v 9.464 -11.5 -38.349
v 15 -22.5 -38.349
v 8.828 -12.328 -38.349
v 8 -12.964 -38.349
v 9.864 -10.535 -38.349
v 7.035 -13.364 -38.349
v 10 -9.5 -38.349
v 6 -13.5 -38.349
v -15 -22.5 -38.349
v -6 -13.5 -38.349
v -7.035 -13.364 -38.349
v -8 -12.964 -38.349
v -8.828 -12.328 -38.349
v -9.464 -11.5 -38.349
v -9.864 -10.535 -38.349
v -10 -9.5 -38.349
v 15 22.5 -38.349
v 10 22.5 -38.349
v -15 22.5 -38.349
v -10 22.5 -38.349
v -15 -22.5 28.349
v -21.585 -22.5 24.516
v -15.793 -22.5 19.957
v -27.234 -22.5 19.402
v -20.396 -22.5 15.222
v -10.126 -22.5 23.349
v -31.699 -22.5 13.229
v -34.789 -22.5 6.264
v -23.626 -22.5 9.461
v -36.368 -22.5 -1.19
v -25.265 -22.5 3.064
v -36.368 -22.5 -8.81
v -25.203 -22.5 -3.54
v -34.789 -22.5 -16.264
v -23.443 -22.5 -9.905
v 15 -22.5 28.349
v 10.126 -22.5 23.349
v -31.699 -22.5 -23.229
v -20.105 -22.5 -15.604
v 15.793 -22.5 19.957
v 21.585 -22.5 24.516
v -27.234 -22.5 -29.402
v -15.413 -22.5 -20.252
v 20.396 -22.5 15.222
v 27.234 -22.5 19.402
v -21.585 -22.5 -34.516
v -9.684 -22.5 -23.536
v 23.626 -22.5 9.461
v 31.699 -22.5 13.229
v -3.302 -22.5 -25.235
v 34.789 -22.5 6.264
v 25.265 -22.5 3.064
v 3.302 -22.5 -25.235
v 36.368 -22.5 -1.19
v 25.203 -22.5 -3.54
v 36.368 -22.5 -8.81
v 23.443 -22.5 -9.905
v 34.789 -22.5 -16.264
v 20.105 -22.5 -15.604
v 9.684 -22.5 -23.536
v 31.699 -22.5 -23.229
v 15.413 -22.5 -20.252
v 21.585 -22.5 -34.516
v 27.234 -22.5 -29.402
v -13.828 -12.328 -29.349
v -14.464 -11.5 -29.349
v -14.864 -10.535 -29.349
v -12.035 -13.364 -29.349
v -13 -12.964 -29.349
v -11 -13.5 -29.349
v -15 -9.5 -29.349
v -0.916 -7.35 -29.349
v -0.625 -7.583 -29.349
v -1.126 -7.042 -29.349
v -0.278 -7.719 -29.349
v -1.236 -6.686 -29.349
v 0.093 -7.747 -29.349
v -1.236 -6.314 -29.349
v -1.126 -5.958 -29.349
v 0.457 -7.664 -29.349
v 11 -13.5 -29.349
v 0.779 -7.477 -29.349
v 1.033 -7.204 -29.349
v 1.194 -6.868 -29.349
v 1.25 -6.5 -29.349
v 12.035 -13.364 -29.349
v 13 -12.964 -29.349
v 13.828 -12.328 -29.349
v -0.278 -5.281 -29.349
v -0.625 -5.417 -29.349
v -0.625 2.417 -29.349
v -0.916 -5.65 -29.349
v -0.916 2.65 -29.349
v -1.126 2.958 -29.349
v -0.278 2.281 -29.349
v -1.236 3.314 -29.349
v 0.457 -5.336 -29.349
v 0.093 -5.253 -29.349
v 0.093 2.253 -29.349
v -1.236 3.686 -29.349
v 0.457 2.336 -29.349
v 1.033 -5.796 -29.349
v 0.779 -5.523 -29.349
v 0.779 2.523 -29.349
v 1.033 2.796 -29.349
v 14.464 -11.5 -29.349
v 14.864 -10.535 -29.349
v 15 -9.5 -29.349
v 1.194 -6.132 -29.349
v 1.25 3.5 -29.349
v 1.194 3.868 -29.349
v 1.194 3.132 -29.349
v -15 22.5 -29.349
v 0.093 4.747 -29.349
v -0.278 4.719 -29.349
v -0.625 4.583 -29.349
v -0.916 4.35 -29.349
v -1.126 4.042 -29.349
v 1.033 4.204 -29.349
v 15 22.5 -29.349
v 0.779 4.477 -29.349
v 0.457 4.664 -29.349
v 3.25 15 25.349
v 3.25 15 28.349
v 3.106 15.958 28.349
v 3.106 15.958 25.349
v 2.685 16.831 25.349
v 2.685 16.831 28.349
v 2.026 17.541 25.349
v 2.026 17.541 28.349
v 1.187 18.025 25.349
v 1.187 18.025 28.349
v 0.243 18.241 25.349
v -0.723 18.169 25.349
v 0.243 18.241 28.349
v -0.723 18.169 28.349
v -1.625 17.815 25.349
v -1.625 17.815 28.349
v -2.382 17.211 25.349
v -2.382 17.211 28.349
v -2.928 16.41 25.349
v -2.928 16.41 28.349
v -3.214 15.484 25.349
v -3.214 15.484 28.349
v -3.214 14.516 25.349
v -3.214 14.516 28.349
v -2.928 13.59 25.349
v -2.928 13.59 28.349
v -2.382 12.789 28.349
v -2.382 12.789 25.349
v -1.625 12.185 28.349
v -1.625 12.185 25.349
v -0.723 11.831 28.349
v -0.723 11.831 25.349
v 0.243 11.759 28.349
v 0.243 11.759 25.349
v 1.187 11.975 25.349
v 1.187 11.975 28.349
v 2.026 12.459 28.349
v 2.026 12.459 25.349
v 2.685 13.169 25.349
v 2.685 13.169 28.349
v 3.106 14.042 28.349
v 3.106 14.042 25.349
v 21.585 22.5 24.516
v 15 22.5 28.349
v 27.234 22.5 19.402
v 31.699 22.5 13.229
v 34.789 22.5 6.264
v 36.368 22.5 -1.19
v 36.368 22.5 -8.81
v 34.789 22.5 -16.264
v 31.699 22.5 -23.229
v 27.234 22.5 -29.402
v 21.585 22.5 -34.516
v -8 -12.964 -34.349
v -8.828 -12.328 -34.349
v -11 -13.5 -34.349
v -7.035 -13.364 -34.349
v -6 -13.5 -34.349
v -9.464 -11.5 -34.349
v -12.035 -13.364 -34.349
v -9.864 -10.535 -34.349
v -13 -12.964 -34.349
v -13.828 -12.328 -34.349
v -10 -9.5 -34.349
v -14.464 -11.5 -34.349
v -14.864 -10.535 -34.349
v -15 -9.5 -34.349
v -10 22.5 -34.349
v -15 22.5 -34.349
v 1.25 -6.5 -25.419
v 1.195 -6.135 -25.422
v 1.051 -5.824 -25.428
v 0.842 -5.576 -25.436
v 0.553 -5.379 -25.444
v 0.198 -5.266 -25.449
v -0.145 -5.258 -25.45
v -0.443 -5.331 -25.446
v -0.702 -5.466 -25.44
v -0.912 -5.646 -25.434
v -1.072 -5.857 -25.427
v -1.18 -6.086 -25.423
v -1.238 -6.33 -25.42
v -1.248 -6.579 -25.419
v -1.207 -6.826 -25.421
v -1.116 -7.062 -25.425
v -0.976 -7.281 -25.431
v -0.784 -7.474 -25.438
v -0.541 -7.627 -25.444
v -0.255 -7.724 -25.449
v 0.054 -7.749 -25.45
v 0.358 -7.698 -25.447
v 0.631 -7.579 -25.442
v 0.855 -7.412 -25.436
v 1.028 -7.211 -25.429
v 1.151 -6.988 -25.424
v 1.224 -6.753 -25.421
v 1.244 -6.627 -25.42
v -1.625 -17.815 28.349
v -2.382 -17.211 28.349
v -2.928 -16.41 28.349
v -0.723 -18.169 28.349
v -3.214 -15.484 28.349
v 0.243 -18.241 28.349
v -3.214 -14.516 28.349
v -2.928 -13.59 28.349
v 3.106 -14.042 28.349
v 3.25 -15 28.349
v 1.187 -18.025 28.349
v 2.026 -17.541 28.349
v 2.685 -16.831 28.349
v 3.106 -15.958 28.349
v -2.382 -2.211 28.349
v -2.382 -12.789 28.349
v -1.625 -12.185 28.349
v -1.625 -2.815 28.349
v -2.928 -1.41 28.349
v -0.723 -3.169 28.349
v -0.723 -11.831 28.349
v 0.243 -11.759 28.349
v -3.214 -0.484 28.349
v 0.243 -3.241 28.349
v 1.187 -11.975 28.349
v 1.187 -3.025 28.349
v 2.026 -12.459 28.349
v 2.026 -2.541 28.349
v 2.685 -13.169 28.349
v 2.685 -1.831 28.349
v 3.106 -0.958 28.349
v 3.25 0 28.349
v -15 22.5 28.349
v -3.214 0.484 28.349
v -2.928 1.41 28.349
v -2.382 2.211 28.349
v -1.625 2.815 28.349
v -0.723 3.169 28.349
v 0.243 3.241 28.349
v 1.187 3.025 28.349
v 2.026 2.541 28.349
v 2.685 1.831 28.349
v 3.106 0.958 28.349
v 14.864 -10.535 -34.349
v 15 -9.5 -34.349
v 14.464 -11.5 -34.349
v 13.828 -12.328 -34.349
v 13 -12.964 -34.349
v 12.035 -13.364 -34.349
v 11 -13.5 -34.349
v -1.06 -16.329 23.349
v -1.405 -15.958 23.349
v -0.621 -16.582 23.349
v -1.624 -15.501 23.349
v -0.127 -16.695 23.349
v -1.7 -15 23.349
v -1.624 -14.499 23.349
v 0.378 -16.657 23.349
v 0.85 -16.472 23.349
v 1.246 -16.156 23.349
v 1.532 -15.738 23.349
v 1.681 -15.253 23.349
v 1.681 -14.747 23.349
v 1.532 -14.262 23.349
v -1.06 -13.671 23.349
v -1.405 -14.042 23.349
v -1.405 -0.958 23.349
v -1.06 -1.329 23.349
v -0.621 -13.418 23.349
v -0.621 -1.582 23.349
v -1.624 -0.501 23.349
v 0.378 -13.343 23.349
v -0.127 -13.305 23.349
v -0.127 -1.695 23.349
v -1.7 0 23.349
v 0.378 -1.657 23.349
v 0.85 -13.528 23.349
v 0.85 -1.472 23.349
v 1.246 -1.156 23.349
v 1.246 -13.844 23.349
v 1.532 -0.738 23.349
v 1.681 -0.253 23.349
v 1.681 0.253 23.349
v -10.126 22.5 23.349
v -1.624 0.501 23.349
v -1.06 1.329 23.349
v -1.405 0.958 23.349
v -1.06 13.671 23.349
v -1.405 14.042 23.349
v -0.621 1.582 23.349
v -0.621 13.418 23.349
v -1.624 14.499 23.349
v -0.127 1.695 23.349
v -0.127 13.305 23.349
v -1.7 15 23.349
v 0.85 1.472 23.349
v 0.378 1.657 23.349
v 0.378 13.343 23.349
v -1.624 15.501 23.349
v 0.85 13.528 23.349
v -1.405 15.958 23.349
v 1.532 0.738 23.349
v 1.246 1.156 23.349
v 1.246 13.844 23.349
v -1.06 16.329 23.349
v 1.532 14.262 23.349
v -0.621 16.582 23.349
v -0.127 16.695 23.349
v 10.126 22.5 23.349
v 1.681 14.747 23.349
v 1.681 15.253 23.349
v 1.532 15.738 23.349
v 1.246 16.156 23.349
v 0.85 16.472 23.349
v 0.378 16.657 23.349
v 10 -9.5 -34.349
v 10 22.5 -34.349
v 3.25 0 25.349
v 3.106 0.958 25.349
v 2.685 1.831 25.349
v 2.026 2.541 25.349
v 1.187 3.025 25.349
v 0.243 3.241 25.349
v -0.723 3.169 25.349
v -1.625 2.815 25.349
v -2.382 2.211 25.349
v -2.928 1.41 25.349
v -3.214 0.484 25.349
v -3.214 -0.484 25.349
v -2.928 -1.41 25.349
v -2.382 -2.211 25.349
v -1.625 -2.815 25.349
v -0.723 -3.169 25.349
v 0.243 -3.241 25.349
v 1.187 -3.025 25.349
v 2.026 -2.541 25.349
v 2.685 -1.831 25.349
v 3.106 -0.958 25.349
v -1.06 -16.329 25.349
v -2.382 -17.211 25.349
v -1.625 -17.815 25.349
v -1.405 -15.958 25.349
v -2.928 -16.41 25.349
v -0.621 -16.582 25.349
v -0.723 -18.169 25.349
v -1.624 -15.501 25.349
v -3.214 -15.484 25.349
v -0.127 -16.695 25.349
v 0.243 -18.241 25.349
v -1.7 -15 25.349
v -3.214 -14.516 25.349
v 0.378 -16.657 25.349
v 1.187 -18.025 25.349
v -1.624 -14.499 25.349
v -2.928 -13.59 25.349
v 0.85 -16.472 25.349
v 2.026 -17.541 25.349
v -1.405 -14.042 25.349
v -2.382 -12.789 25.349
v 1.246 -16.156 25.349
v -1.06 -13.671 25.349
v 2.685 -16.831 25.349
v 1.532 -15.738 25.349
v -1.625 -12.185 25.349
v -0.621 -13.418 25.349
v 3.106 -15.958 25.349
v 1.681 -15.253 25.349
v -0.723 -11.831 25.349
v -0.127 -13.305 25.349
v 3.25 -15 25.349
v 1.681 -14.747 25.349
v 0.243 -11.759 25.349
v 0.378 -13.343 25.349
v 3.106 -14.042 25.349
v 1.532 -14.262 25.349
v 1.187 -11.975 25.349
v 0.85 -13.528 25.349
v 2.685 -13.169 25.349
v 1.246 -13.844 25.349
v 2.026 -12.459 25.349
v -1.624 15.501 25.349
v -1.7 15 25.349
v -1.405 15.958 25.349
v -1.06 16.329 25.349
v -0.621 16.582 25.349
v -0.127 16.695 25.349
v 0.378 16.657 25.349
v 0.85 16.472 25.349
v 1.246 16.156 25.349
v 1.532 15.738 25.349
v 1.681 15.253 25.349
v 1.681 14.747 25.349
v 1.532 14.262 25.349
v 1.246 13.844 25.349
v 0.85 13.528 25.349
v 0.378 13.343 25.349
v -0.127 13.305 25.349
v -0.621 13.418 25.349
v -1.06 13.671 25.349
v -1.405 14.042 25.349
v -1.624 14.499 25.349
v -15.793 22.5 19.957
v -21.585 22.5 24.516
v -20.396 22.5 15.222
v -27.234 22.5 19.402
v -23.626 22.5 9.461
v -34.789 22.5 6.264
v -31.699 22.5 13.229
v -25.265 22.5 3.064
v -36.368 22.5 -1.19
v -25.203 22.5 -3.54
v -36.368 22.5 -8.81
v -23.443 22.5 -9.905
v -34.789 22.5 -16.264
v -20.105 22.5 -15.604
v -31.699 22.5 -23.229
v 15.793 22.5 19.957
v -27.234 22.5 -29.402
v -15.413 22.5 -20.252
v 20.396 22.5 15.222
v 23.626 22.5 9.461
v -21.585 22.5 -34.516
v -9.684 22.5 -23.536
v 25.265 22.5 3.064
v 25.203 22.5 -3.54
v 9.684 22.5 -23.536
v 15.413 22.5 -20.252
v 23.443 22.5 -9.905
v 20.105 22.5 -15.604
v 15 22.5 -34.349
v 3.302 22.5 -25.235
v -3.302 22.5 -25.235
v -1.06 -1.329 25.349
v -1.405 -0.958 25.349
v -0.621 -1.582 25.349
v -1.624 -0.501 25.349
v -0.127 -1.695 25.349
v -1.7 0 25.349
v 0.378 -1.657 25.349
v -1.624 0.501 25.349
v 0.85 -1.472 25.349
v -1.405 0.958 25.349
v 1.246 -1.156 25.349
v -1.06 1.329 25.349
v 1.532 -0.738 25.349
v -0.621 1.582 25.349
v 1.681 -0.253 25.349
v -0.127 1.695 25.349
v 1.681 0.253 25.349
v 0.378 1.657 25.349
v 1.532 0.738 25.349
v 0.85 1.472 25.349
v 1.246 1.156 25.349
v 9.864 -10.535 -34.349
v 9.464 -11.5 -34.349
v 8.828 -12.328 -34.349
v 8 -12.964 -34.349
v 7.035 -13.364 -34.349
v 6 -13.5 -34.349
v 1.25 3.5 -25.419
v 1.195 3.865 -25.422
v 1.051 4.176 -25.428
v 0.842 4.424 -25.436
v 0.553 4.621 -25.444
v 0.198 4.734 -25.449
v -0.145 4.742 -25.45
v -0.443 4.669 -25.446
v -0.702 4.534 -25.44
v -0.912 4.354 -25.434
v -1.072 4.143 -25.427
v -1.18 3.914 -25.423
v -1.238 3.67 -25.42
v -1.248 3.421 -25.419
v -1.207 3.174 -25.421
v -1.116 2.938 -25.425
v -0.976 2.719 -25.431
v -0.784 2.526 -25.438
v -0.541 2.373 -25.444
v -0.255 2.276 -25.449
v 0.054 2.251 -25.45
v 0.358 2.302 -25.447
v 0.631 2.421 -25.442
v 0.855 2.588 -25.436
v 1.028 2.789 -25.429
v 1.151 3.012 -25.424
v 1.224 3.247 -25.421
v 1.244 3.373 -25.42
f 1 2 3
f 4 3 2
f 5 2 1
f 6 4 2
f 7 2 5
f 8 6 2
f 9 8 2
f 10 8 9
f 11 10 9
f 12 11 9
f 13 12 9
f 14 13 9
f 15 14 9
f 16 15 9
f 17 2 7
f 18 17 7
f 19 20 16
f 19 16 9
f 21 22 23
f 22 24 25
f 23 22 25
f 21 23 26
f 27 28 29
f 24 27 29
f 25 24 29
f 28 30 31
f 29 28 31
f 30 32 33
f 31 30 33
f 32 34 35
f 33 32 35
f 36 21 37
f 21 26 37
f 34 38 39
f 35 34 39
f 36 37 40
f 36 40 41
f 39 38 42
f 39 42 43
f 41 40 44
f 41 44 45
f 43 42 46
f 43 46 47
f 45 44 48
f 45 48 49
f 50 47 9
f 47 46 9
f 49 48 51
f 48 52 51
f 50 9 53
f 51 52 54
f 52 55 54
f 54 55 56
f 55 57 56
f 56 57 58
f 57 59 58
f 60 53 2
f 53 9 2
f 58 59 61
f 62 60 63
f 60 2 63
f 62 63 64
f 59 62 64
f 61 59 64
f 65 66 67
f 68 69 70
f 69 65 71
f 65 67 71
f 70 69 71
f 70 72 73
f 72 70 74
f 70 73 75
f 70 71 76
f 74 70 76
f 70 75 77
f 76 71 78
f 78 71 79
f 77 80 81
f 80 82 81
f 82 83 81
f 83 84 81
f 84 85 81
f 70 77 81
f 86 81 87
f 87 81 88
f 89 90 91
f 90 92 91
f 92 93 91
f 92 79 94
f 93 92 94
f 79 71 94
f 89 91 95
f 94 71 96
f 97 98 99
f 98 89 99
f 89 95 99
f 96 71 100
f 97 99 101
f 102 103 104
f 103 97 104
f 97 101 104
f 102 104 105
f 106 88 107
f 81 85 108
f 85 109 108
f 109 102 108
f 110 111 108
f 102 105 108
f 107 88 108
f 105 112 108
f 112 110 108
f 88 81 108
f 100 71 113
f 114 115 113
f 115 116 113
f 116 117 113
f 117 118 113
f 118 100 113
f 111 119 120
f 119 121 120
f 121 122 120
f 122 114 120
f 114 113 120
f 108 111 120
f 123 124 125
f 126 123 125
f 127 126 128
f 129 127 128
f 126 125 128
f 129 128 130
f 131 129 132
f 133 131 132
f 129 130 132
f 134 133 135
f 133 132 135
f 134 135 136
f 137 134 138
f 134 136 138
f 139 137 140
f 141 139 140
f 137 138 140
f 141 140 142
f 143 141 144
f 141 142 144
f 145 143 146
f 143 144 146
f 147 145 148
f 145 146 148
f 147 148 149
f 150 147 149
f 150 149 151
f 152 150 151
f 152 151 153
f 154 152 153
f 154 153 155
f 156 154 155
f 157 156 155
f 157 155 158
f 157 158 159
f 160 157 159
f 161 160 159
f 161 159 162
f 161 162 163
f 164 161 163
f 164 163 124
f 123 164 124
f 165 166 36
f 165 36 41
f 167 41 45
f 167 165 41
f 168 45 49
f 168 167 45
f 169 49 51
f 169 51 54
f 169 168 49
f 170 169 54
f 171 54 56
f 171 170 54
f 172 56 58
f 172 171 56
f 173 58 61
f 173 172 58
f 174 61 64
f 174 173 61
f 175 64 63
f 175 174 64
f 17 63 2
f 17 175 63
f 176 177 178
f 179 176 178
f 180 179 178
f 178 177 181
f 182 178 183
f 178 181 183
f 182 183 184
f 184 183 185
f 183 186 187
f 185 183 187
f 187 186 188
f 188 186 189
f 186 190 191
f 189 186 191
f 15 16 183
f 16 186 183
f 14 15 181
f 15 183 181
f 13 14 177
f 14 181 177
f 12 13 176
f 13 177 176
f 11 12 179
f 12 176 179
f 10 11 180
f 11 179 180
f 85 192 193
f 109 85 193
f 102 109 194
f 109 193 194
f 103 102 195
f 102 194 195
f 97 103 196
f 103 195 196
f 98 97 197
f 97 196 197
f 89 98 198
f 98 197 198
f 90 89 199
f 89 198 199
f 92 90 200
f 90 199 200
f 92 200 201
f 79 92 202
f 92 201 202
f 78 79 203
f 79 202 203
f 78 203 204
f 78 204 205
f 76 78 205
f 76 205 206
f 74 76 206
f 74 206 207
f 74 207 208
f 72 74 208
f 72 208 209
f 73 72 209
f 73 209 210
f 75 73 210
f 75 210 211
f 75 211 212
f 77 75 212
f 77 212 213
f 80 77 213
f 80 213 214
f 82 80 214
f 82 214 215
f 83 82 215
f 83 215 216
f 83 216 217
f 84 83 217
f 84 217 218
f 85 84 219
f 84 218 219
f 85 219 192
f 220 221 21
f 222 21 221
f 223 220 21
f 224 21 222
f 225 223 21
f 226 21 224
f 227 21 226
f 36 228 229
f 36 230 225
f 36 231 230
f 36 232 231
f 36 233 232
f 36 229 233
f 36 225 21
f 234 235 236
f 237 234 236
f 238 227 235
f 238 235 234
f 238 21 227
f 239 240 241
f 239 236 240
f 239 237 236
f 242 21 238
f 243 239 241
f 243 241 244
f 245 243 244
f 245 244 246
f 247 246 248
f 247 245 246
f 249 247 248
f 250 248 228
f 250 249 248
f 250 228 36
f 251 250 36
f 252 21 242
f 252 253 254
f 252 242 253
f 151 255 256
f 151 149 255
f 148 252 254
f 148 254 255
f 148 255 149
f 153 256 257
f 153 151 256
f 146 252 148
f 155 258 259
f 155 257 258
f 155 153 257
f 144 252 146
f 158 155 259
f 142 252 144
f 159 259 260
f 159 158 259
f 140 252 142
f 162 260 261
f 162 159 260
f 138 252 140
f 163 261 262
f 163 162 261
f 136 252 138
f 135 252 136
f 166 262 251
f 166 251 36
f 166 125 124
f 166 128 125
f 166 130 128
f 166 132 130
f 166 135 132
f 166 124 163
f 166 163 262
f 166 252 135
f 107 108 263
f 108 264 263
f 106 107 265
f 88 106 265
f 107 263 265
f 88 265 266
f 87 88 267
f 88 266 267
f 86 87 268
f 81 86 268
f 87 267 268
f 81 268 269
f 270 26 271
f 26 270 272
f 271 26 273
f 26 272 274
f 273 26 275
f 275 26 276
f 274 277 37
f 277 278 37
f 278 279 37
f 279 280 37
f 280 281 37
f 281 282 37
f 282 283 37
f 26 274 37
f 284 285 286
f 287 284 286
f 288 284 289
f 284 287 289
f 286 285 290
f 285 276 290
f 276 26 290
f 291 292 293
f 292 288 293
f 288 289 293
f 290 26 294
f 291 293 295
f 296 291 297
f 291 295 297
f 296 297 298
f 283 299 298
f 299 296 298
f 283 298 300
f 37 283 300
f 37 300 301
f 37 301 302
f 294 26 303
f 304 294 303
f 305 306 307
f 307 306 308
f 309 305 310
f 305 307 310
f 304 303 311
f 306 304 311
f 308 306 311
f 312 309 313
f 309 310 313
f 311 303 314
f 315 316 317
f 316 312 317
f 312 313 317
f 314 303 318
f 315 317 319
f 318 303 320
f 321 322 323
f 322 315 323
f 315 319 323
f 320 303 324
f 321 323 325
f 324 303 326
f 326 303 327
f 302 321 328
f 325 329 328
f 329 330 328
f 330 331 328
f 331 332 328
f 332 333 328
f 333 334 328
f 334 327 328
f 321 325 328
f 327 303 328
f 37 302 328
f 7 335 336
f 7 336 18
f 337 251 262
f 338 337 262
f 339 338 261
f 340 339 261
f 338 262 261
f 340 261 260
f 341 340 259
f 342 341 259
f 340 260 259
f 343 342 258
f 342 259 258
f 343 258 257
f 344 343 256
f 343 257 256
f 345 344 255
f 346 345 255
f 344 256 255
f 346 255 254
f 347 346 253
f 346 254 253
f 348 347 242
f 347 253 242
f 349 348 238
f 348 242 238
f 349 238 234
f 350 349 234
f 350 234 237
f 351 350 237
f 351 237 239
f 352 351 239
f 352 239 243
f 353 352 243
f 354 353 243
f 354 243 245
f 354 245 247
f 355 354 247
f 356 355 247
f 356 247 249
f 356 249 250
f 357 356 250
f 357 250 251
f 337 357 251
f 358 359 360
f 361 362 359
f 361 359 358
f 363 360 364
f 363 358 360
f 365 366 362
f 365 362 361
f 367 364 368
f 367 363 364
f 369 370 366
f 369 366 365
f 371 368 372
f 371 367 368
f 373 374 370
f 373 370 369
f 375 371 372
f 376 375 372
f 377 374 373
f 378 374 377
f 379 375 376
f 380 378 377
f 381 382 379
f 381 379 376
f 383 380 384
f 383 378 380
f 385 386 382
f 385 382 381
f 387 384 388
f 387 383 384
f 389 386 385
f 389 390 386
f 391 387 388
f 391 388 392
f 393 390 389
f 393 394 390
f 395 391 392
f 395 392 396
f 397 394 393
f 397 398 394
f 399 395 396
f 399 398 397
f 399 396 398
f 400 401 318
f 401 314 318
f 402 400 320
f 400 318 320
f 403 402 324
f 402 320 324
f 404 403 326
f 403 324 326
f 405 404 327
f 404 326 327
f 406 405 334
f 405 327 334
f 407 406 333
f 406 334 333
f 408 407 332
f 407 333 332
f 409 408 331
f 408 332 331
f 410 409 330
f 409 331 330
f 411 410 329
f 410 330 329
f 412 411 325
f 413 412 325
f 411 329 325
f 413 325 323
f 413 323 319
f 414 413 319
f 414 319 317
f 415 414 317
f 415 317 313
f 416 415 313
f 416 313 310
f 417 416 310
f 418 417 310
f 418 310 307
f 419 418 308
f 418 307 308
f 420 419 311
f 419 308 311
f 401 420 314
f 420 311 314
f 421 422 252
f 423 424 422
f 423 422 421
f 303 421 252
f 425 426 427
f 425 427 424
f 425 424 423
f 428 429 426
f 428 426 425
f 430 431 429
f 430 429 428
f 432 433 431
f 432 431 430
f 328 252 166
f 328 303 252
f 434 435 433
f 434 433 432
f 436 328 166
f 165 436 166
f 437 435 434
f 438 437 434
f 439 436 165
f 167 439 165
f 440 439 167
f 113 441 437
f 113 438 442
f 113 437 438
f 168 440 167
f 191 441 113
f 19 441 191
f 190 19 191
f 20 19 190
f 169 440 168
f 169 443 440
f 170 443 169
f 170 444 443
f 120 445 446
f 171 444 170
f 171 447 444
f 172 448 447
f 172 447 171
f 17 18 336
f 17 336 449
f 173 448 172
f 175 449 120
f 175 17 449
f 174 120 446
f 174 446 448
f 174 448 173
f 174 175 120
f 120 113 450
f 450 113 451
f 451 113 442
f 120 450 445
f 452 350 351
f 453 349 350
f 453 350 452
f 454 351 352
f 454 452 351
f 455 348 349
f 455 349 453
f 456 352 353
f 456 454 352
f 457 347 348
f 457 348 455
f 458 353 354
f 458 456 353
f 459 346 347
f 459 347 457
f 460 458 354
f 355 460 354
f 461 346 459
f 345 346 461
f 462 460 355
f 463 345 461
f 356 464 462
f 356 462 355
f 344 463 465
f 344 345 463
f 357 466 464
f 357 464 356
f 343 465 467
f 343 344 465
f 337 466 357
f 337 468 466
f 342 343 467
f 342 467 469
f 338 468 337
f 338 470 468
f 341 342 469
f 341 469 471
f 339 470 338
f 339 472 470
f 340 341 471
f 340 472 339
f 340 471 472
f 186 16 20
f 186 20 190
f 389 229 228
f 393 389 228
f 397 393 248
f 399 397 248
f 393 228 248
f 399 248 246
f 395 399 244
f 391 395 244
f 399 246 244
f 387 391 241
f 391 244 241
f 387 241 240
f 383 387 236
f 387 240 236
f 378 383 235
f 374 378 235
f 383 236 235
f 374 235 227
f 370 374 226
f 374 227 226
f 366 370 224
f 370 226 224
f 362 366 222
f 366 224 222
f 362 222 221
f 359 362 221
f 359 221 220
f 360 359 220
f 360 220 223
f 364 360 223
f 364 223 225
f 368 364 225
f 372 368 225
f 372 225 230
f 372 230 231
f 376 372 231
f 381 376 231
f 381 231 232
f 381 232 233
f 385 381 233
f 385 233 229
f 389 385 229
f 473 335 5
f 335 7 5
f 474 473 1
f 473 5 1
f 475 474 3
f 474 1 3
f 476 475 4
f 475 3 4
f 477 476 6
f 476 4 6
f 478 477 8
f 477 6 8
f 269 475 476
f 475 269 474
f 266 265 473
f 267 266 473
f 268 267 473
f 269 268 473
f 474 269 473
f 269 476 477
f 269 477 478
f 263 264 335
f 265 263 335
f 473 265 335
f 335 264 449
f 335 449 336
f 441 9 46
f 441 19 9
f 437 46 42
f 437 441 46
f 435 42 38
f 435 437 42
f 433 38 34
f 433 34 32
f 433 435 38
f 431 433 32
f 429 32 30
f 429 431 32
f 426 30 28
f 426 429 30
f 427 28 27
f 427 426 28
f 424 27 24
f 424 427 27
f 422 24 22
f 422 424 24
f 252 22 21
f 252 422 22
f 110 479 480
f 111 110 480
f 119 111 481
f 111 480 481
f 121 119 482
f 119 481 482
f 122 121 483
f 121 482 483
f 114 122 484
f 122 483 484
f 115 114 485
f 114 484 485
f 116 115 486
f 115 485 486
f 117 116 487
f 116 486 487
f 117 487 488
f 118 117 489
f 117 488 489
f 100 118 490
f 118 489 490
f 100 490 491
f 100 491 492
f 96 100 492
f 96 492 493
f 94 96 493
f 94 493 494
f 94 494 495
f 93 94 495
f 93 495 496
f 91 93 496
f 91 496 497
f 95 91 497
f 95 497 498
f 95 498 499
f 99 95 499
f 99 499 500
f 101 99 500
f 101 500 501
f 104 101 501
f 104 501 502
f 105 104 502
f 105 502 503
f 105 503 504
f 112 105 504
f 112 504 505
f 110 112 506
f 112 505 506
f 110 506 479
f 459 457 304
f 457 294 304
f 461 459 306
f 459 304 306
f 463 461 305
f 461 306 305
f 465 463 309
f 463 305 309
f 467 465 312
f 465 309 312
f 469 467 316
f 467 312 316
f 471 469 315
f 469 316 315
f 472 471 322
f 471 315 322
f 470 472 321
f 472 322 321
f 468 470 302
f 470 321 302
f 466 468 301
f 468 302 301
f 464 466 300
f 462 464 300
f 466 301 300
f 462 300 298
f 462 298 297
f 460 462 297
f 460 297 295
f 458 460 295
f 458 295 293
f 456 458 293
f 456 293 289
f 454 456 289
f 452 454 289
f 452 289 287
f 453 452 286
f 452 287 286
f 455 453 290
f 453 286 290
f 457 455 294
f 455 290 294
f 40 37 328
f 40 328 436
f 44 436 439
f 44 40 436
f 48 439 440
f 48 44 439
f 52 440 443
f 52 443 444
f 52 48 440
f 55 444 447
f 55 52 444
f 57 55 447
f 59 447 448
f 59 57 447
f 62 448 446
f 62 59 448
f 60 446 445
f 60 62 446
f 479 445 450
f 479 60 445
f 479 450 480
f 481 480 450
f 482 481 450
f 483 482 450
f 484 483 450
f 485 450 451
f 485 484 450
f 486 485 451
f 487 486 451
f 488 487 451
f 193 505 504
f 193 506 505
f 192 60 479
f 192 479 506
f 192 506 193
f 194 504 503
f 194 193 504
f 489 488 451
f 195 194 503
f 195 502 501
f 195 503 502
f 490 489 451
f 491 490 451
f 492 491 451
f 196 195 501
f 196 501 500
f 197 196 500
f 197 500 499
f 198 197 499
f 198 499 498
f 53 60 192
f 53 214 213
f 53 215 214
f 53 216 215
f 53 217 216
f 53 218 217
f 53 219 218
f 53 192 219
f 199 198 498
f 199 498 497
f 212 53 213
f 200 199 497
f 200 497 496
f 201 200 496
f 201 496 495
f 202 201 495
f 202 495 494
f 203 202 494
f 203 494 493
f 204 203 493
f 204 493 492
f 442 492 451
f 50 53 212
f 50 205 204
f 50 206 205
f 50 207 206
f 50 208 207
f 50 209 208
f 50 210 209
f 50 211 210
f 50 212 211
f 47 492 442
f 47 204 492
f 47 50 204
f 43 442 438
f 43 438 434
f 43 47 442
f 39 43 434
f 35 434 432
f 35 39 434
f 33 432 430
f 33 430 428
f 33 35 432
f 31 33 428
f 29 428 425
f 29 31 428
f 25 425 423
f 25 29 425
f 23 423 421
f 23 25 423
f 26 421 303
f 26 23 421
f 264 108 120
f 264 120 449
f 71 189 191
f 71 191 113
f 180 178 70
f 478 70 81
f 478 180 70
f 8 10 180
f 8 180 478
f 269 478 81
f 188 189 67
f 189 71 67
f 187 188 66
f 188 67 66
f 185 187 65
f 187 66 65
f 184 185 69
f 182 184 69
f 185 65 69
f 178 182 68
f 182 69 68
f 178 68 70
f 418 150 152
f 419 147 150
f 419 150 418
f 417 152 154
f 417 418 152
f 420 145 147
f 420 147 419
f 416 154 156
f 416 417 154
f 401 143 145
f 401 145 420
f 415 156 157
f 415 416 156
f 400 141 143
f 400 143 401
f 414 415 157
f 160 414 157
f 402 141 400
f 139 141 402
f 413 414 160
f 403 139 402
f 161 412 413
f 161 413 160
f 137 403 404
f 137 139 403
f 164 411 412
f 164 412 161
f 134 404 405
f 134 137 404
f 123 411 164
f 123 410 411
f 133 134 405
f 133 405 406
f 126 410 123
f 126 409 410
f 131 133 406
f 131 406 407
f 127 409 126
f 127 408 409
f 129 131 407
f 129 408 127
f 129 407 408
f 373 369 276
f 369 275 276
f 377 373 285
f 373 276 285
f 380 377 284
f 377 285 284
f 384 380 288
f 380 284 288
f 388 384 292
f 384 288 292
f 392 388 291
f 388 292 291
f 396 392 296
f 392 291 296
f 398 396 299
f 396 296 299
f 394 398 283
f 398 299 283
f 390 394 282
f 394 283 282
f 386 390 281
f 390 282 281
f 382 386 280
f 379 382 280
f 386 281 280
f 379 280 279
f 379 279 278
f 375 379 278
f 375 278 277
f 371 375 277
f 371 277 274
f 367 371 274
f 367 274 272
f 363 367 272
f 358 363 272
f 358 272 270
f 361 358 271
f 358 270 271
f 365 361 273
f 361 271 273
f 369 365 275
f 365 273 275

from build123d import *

# Parameters (mm, degrees)
BOSS_EXTRUDE1_DEPTH            = 22.5
CUT_EXTRUDE1_DEPTH             = 36
CBORE_FOR_M3_SHCS1_D           = 3.4
CBORE_FOR_M3_SHCS1_DEPTH       = 5
CBORE_FOR_M3_SHCS1_CBORE_D     = 6.5
CBORE_FOR_M3_SHCS1_CBORE_DEPTH = 3
CBORE_FOR_M3_SHCS1_TIP         = 1.021463052
M3X0_5_TAPPED_HOLE1_D          = 2.5
M3X0_5_TAPPED_HOLE1_DEPTH      = 27.571916674
M3X0_5_TAPPED_HOLE1_TIP        = 0.751075774
FILLET2_R                      = 4
TOLERANCING_START              = -22.5
TOLERANCING_DEPTH              = 45


# Read off the part's stored shape, not the designer's step: Tolerancing
with BuildPart() as part:
    # Sketch1 → Boss-Extrude1 (new, symmetric)
    with BuildSketch(Plane(origin=(0, 0, 0), x_dir=(1, 0, 0), z_dir=(0, 1, 0))):
        with BuildLine():
            Line((-15, -28.348661632), (15, -28.348661632))
            ThreePointArc((15, -28.348661632), (36.566832412, 5), (15, 38.348661632))
            Line((15, 38.348661632), (-15, 38.348661632))
            ThreePointArc((-15, 38.348661632), (-36.566832412, 5), (-15, -28.348661632))
        make_face()
        with BuildLine():
            Line((-10, -23.348661632), (10, -23.348661632))
            ThreePointArc((10, -23.348661632), (0, 25.4), (-10, -23.348661632))
        make_face(mode=Mode.SUBTRACT)
    extrude(amount=BOSS_EXTRUDE1_DEPTH, both=True)

    # Sketch4 → Cut-Extrude1 (cut)
    with BuildSketch(Plane(origin=(0, 22.5, 0), x_dir=(1, 0, 0), z_dir=(0, 1, 0))):
        Polygon((-10, 38.348661632), (-10, 34.348661632), (-15, 34.348661632), (-15, 29.348661632), (15, 29.348661632), (15, 34.348661632), (10, 34.348661632), (10, 38.348661632), align=None)
    extrude(amount=-CUT_EXTRUDE1_DEPTH, mode=Mode.SUBTRACT)

    # CBORE for M3 SHCS1
    with Locations(Plane.XY.offset(28.348661632)):
        with Locations((0, 0), (0, 15), (0, -15)):
            CounterBoreHole(CBORE_FOR_M3_SHCS1_D / 2, CBORE_FOR_M3_SHCS1_CBORE_D / 2, CBORE_FOR_M3_SHCS1_CBORE_DEPTH, depth=CBORE_FOR_M3_SHCS1_DEPTH)
            with Locations((0, 0, -(CBORE_FOR_M3_SHCS1_DEPTH + CBORE_FOR_M3_SHCS1_TIP / 2))):  # 118° drill point
                Cone(0, CBORE_FOR_M3_SHCS1_D / 2, CBORE_FOR_M3_SHCS1_TIP, mode=Mode.SUBTRACT)

    # M3x0.5 Tapped Hole1
    with Locations(Plane(origin=(0, 0, -29.348661632), x_dir=(-1, 0, 0), z_dir=(0, 0, -1))):
        with Locations((0, 3.5), (0, -6.5)):
            Hole(M3X0_5_TAPPED_HOLE1_D / 2, depth=M3X0_5_TAPPED_HOLE1_DEPTH)
            with Locations((0, 0, -(M3X0_5_TAPPED_HOLE1_DEPTH + M3X0_5_TAPPED_HOLE1_TIP / 2))):  # 118° drill point
                Cone(0, M3X0_5_TAPPED_HOLE1_D / 2, M3X0_5_TAPPED_HOLE1_TIP, mode=Mode.SUBTRACT)

    # Fillet2
    fillet2_edges = [part.edges().sort_by_distance(p)[0] for p in [
        (10, -13.5, -36.348661632),
        (15, -13.5, -31.848661632),
        (-15, -13.5, -31.848661632),
        (-10, -13.5, -36.348661632),
    ]]
    fillet(fillet2_edges, radius=FILLET2_R)

    # Tolerancing outline → Tolerancing (cut)
    with BuildSketch(Plane(origin=(0, 0, 0), x_dir=(1, 0, 0), z_dir=(0, 1, 0)).offset(TOLERANCING_START)):
        with BuildLine():
            ThreePointArc((10.126327074, -23.348661632), (0, 25.45), (-10.126327074, -23.348661632))
            Line((-10.126327074, -23.348661632), (-10, -23.348661632))
            ThreePointArc((-10, -23.348661632), (0, 25.4), (10, -23.348661632))
            Line((10, -23.348661632), (10.126327074, -23.348661632))
        make_face()
    extrude(amount=TOLERANCING_DEPTH, mode=Mode.SUBTRACT)


solid = part.part
